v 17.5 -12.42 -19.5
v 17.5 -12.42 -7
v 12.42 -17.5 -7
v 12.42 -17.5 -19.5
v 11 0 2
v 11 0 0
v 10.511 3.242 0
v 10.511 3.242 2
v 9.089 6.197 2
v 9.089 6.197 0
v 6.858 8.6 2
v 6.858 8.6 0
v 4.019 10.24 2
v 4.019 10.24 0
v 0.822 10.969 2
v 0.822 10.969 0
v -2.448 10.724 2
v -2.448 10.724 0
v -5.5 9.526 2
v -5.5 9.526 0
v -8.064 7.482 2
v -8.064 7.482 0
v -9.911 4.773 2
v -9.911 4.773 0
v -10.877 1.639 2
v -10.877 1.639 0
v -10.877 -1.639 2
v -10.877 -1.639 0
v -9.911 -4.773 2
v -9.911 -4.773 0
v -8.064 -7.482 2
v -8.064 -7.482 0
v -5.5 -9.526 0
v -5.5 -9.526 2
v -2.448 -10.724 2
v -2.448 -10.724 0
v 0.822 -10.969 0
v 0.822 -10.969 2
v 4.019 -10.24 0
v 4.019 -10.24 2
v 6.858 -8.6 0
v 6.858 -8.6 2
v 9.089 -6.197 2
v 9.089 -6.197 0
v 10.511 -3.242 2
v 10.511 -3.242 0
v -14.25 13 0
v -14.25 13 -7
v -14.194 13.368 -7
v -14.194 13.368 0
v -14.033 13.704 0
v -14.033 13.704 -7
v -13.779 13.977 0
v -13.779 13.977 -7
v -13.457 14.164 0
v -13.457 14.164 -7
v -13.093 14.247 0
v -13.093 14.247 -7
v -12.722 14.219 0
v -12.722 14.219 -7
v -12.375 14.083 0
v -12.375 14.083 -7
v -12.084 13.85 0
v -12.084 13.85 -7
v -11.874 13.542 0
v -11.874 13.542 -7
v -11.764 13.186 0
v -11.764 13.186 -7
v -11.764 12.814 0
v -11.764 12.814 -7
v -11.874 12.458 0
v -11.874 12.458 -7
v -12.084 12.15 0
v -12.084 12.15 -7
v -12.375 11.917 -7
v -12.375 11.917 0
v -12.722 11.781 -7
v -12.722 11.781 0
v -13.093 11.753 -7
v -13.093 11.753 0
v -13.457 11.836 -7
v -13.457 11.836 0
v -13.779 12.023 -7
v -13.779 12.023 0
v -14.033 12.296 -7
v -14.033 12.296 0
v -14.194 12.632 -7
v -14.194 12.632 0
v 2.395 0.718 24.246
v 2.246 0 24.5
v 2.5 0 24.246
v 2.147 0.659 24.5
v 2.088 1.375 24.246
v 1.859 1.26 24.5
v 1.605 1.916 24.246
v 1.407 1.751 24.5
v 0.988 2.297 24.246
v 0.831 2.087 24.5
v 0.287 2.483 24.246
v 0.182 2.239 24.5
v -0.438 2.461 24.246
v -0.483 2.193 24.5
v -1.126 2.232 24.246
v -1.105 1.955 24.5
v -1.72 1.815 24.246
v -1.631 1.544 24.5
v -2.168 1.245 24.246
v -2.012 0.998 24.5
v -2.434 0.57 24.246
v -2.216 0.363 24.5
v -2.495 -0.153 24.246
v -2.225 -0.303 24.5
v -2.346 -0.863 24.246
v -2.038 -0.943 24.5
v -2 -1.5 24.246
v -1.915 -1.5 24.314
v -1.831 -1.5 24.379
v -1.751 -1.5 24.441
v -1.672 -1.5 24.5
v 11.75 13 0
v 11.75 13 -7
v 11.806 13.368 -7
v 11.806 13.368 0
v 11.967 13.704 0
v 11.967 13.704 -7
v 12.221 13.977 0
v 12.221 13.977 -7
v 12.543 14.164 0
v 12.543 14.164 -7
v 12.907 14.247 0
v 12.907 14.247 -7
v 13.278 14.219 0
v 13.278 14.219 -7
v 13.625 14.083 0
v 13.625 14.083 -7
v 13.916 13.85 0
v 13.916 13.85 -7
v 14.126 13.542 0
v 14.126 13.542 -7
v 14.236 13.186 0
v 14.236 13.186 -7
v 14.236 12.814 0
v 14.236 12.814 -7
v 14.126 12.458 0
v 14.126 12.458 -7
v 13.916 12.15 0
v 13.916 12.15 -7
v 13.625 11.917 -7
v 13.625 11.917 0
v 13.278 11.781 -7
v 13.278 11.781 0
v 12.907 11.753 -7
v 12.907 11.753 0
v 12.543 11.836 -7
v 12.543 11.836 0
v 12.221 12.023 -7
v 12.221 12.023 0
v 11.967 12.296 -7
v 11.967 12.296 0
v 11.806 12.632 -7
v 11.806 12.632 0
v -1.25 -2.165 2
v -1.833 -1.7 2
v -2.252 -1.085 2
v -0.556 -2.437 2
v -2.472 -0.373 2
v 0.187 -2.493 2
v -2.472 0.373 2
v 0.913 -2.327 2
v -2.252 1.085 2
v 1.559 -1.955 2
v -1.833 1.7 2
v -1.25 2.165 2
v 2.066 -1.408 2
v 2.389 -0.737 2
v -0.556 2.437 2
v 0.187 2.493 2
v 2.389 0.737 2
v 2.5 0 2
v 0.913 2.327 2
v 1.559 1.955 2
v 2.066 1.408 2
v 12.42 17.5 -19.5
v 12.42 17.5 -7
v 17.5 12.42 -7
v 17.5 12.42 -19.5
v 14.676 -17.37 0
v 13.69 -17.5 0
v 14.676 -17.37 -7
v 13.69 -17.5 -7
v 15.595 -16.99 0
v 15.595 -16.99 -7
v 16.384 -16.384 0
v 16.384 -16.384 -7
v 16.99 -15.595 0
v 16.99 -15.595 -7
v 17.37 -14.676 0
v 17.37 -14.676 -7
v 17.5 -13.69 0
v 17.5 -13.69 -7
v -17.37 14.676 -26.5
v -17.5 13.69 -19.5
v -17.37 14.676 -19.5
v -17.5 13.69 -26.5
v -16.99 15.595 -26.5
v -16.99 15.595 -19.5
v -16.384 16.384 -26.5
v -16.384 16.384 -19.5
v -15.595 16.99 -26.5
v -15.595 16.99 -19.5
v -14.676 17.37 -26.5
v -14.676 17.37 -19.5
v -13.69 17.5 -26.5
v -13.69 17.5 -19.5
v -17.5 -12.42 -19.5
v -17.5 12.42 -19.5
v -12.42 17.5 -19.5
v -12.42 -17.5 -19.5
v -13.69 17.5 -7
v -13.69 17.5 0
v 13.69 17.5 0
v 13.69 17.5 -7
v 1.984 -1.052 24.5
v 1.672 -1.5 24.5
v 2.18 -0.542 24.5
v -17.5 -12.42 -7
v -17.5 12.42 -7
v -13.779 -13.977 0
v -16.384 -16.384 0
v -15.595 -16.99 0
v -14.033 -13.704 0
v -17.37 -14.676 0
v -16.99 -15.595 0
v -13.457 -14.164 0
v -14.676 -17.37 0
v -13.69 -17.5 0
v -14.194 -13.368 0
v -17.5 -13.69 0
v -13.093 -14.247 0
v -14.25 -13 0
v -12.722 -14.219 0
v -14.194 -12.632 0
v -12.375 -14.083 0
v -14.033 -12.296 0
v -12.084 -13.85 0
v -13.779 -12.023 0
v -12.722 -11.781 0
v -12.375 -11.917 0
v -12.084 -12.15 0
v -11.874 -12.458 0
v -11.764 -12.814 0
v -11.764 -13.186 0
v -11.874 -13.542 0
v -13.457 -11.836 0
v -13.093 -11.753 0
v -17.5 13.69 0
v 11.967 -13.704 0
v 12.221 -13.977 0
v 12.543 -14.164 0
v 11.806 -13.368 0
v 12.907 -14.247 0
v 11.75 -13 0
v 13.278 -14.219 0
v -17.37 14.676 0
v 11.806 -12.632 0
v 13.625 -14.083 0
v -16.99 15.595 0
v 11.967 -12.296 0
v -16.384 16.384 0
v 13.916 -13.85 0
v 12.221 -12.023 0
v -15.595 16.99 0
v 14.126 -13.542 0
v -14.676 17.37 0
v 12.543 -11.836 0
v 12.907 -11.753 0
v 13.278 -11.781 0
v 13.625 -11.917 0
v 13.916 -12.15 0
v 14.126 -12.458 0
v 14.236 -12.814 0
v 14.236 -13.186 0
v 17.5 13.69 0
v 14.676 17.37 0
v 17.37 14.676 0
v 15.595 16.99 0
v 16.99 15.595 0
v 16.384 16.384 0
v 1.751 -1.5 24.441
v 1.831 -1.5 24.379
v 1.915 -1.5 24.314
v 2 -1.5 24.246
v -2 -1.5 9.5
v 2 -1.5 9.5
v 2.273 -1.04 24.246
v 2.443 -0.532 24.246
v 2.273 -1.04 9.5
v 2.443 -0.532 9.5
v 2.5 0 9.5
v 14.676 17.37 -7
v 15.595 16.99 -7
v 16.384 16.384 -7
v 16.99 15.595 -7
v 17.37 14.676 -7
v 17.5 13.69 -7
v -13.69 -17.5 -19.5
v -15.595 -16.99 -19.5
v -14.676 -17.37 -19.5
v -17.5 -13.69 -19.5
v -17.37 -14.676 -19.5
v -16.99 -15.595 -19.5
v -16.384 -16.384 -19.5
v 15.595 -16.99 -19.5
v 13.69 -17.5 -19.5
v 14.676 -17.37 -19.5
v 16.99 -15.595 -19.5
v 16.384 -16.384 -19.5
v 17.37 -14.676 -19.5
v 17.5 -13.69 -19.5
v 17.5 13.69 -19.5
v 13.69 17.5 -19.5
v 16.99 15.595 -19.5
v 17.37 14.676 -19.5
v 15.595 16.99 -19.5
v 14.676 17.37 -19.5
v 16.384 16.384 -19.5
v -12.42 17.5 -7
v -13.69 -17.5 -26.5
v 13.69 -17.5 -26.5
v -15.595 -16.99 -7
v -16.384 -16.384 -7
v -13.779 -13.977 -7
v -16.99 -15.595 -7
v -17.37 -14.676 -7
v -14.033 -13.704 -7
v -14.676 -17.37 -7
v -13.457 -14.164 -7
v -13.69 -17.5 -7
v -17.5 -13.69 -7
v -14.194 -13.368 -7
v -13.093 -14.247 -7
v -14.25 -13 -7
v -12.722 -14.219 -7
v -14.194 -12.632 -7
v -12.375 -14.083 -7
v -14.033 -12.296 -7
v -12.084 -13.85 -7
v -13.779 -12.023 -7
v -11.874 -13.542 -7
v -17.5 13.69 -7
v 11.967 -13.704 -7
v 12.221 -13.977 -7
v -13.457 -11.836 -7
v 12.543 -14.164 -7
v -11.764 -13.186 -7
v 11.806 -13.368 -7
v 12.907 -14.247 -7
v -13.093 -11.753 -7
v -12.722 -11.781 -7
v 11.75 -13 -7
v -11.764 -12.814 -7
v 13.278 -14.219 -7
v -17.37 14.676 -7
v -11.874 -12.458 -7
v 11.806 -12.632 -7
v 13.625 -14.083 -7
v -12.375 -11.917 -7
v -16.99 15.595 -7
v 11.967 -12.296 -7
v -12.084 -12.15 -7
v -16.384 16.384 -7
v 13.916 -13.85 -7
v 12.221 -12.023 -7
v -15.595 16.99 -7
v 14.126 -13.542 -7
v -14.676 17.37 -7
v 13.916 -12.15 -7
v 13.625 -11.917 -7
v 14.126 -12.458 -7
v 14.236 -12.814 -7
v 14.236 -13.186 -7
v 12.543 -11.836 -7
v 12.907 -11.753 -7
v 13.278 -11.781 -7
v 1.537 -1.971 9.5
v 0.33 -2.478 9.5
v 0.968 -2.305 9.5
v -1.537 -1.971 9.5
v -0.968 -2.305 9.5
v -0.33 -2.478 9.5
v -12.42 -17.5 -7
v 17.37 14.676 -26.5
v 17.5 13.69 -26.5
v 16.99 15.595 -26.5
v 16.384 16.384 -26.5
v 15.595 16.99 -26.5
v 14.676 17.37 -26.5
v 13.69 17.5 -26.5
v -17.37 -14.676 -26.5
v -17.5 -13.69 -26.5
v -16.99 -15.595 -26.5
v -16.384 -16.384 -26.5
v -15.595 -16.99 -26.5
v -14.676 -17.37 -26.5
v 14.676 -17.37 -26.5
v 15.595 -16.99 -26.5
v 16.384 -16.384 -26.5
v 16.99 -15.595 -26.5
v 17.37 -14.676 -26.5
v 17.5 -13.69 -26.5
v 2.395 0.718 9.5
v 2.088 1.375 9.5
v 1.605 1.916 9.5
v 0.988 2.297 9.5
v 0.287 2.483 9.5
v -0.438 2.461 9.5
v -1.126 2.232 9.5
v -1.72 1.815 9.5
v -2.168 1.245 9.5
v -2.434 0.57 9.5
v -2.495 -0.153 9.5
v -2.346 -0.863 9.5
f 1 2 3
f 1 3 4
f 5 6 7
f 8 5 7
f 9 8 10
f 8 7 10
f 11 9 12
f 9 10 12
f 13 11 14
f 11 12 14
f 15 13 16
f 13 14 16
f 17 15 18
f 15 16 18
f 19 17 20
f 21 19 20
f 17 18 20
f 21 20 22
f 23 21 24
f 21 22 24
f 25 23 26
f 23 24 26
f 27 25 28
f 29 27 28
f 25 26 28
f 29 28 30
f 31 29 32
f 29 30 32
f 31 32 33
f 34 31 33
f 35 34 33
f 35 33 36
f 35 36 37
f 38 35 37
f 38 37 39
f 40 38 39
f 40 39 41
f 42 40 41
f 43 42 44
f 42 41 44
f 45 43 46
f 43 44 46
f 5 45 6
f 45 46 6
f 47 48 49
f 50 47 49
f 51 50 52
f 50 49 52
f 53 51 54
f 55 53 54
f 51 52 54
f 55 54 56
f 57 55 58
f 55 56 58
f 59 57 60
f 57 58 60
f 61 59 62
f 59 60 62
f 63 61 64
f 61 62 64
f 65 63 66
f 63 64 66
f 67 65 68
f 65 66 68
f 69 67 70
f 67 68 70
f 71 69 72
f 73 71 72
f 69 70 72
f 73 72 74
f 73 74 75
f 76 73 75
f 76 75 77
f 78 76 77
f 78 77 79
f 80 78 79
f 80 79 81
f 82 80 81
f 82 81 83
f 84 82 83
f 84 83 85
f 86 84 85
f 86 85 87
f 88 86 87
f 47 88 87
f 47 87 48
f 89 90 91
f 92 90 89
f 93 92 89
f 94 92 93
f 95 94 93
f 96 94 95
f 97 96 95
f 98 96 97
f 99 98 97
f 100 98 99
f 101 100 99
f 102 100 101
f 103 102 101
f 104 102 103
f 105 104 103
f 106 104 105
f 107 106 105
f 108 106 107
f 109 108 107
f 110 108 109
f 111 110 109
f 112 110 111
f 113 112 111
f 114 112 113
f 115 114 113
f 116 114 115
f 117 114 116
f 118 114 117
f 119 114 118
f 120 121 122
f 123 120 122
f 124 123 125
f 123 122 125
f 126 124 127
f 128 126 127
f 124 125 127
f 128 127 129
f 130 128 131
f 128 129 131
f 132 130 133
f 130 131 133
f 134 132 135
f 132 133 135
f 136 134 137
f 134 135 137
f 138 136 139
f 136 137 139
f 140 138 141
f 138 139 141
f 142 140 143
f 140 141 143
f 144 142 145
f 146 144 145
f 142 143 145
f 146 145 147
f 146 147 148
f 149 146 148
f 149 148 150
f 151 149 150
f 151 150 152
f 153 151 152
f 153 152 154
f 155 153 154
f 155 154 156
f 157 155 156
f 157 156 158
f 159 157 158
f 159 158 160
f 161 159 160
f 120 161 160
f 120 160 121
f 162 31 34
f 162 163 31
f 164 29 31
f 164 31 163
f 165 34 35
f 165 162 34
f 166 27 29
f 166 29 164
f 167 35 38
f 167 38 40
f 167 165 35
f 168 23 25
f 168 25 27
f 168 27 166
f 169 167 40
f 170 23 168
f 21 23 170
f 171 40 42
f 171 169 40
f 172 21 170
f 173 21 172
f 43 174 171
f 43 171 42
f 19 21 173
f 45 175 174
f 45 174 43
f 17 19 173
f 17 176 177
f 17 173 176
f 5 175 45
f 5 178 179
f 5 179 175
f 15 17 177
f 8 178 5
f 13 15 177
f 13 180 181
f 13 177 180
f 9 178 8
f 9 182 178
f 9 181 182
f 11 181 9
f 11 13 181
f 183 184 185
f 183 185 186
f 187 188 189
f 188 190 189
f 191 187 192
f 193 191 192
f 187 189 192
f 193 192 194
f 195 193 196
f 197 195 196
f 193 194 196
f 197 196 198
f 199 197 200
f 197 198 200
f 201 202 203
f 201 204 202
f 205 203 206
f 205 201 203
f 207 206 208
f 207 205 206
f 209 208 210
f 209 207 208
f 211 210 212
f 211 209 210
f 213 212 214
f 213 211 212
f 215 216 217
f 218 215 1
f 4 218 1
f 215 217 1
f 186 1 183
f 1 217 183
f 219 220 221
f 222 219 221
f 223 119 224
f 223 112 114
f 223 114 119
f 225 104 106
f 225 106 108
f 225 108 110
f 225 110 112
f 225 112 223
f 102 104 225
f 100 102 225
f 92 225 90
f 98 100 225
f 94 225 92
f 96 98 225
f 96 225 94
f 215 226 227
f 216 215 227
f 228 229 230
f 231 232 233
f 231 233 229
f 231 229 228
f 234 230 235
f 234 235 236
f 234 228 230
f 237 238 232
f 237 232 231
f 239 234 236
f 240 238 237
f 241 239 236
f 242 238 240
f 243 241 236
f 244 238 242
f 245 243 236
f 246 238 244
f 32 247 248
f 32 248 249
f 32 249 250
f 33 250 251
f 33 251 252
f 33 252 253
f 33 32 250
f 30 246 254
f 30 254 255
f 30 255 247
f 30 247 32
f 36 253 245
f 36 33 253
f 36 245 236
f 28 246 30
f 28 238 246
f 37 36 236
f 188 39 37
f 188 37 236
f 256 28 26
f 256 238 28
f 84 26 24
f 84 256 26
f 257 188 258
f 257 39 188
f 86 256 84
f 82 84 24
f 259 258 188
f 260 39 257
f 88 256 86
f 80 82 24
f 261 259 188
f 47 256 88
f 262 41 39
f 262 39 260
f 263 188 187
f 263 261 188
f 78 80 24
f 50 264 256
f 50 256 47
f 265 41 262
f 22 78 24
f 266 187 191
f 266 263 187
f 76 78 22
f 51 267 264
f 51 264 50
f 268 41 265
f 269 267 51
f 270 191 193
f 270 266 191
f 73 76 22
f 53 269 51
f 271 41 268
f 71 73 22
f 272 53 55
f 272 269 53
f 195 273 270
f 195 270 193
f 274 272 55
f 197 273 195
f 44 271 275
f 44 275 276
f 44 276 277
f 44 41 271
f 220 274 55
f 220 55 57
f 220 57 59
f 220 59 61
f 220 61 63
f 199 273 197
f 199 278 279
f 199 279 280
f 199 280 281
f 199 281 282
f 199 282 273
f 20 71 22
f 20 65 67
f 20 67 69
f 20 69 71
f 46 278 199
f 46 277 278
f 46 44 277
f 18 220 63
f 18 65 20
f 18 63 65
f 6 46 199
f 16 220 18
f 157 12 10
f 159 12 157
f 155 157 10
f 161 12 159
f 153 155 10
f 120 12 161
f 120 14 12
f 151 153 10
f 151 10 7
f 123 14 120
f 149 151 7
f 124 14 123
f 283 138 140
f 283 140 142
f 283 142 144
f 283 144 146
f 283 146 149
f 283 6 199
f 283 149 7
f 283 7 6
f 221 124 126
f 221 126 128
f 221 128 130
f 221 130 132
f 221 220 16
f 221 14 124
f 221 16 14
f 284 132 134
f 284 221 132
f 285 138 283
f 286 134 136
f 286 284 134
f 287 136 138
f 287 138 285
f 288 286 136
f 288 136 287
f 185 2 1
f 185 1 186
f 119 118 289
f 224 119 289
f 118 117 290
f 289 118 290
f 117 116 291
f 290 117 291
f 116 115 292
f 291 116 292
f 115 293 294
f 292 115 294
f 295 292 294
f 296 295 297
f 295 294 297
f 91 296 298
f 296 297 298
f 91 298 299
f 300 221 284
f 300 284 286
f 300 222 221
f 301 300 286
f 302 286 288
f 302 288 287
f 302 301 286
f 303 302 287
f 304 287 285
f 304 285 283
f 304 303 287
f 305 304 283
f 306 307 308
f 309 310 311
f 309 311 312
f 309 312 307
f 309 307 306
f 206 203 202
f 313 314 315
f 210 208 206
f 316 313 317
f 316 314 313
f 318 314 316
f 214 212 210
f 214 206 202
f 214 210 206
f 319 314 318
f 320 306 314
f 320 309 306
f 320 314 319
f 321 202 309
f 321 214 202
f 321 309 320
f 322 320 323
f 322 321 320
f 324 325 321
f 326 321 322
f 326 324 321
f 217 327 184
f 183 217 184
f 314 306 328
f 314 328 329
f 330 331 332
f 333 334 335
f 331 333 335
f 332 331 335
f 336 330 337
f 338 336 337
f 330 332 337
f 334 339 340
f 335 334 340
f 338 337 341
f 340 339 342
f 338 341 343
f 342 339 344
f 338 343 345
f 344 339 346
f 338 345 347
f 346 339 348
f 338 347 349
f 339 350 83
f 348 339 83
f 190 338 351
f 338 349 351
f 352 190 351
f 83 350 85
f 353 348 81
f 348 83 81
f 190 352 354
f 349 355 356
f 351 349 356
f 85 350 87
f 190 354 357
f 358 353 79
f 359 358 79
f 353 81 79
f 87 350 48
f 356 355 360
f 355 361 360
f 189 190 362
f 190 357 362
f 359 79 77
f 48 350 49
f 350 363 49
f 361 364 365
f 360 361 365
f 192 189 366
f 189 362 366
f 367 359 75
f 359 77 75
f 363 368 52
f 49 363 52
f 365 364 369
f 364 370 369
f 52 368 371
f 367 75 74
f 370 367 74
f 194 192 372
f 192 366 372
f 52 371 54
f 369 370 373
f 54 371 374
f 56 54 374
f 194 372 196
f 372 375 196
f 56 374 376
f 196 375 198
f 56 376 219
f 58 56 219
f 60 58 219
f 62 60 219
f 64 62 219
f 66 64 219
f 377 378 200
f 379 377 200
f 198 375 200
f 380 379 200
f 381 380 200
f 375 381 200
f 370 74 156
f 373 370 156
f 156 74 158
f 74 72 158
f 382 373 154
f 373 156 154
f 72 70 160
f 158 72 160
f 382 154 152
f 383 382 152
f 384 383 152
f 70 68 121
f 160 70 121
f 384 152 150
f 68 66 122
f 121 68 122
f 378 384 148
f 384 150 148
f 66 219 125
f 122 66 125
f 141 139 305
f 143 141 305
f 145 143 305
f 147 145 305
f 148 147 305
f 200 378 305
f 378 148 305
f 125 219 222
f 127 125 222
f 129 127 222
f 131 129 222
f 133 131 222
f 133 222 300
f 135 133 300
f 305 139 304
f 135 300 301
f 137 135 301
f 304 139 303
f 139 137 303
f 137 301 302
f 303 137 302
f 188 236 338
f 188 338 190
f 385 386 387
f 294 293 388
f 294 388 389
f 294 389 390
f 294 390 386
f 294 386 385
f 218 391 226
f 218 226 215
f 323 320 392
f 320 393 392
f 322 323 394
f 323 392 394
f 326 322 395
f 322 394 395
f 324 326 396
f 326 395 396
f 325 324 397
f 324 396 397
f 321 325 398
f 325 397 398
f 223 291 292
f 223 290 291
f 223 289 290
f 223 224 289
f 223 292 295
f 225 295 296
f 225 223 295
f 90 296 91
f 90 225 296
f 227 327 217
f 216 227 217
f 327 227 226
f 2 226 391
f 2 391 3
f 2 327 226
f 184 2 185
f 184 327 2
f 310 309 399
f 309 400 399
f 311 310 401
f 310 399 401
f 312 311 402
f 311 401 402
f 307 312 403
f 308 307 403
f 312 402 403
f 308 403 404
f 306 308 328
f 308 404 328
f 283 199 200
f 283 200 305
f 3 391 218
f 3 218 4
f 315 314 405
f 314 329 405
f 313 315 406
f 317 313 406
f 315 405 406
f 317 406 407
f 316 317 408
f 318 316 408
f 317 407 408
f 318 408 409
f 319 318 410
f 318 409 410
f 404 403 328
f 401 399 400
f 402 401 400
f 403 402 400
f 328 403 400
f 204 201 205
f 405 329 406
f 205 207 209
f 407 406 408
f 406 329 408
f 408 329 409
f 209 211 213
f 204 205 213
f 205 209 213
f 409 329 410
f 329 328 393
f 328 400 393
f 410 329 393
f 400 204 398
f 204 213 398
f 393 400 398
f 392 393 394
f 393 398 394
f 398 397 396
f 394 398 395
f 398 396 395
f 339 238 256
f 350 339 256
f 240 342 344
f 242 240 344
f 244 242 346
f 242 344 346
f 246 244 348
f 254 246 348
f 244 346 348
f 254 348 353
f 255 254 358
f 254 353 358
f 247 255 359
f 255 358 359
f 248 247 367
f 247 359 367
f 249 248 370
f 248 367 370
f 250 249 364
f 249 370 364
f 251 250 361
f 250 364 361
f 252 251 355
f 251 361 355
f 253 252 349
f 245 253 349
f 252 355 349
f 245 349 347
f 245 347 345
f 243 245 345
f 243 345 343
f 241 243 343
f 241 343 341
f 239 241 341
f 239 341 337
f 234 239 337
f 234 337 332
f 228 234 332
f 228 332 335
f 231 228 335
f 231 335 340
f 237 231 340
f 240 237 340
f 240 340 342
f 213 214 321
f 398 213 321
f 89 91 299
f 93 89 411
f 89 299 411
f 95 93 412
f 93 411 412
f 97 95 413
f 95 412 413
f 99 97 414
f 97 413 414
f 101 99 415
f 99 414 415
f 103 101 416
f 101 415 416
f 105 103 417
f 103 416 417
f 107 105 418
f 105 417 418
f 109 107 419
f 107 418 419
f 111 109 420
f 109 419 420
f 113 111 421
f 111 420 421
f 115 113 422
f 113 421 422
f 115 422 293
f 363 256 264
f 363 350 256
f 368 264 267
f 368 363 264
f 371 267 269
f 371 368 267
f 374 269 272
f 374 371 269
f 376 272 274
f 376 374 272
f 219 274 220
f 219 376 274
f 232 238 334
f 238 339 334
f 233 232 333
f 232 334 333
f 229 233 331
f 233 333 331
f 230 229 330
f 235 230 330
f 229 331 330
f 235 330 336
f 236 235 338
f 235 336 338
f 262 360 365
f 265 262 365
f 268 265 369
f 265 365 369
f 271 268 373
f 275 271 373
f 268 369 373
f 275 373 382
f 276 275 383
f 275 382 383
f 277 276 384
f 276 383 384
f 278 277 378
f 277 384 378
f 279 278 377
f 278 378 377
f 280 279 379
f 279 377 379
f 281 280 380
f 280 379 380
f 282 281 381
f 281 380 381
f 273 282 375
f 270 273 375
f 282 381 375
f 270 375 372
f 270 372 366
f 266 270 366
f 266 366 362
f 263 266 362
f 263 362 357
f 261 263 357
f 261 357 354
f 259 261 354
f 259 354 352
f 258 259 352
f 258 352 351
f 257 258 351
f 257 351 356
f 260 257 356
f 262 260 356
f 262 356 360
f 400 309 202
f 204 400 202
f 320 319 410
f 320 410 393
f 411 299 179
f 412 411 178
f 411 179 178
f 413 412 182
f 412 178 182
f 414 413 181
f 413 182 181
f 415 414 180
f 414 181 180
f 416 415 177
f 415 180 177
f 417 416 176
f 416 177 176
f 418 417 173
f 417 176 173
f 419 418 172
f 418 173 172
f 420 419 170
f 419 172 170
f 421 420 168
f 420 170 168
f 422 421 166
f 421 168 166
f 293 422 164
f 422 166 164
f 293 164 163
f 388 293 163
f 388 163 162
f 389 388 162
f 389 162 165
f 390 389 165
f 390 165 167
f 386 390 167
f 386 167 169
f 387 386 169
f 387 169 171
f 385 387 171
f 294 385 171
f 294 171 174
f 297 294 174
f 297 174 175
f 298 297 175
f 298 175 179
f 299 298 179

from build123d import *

# Parameters (mm, degrees)
F0_R      = 11
F1_DEPTH  = 2
F0_W      = 35
F0_H      = 35
F2_DEPTH  = 7
F3_DEPTH  = 12.5
F4_DEPTH  = 7
F5_SIZE   = 5.08
F6_R      = 3.81
F6_2_R    = 3.81
F7_D      = 2.5
F7_DEPTH  = 14.2
F7_TIP    = 0.7510757738
F8_R      = 2.5
F9_DEPTH  = 7.5
F11_DEPTH = 15
F12_SIZE  = 0.254


with BuildPart() as f1:
    # F0 (on Top) → F1 (new body)
    with BuildSketch(Plane.XY):
        Circle(F0_R)
    extrude(amount=F1_DEPTH)

    # F0 (on Top) → F2 (join)
    with BuildSketch(Plane.XY):
        Rectangle(F0_W, F0_H)
        Circle(F0_R, mode=Mode.SUBTRACT)
        Circle(F0_R)
    extrude(amount=-F2_DEPTH)


with BuildPart() as f3:
    # F3 (new): a face of the model
    f3_faces = [f1.part.faces().sort_by_distance(p)[0] for p in [
        (0, 0, -7),
    ]]
    extrude(f3_faces, amount=F3_DEPTH)


with BuildPart() as f4:
    # F4 (new): a face of the model
    f4_faces = [f3.part.faces().sort_by_distance(p)[0] for p in [
        (0, 0, -19.5),
    ]]
    extrude(f4_faces, amount=F4_DEPTH)

    # F6#2
    f6_2_edges = [f4.edges().sort_by_distance(p)[0] for p in [
        (17.5, 17.5, -23),
        (17.5, -17.5, -23),
        (-17.5, -17.5, -23),
        (-17.5, 17.5, -23),
    ]]
    fillet(f6_2_edges, radius=F6_2_R)


with BuildPart() as f3_1:
    add(f3.part)

    # F5
    f5_edges = [f3_1.edges().sort_by_distance(p)[0] for p in [
        (-17.5, -17.5, -13.25),
        (17.5, -17.5, -13.25),
        (-17.5, 17.5, -13.25),
        (17.5, 17.5, -13.25),
    ]]
    chamfer(f5_edges, length=F5_SIZE)


with BuildPart() as f1_1:
    add(f1.part)

    # F6
    f6_edges = [f1_1.edges().sort_by_distance(p)[0] for p in [
        (17.5, 17.5, -3.5),
        (17.5, -17.5, -3.5),
        (-17.5, -17.5, -3.5),
        (-17.5, 17.5, -3.5),
    ]]
    fillet(f6_edges, radius=F6_R)

    # F7
    with Locations(Plane.XY):
        with Locations((-13, 13), (13, 13), (13, -13), (-13, -13)):
            Hole(F7_D / 2, depth=F7_DEPTH)
            with Locations((0, 0, -(F7_DEPTH + F7_TIP / 2))):  # 118° drill point
                Cone(0, F7_D / 2, F7_TIP, mode=Mode.SUBTRACT)

    # F8 (on face) → F9 (join)
    with BuildSketch(Plane.XY.offset(2)):
        Circle(F8_R)
    extrude(amount=F9_DEPTH)

    # F10 (on face) → F11 (join)
    with BuildSketch(Plane.XY.offset(9.5)):
        with BuildLine():
            Line((-2, -1.5), (2, -1.5))
            ThreePointArc((2, -1.5), (2.3717082451, -0.790569415), (2.5, 0))
            ThreePointArc((2.5, 0), (-0.790569415, 2.3717082451), (-2, -1.5))
        make_face()
    extrude(amount=F11_DEPTH)

    # F12
    f12_edges = [f1_1.edges().sort_by_distance(p)[0] for p in [
        (0, 2.5, 24.5),
    ]]
    chamfer(f12_edges, length=F12_SIZE)


solid = Compound([f4.part, f3_1.part, f1_1.part])
